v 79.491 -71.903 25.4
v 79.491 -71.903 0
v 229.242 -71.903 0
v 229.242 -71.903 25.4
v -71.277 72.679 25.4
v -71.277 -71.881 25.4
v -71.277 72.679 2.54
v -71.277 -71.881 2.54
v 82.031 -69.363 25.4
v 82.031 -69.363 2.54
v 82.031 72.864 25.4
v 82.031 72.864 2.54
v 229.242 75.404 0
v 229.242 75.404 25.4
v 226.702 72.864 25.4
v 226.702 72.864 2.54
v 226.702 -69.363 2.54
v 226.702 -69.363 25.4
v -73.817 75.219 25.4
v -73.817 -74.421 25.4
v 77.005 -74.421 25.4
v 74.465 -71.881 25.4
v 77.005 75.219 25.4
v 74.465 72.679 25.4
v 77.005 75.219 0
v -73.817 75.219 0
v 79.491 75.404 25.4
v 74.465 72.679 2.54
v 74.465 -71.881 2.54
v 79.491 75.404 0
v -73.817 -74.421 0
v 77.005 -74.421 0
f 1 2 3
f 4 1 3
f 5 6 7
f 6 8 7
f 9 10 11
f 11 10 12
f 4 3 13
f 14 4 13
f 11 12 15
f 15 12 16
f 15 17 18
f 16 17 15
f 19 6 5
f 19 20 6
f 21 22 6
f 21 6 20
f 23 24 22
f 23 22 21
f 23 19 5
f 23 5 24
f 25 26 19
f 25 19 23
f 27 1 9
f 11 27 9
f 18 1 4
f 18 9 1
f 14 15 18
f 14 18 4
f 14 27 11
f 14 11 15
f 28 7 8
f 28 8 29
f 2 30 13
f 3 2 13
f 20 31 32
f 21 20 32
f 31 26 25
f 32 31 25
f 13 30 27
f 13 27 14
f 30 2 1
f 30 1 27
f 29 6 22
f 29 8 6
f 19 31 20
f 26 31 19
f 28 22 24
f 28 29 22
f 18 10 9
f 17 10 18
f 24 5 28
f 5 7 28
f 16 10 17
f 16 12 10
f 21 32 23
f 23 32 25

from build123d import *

# Parameters (mm, degrees)
F0_W     = 150.821939
F0_H     = 149.639666
F1_DEPTH = 25.4
F2_T     = -2.54
F3_W     = 149.751067
F3_H     = 147.307307
F4_DEPTH = 25.4
F5_T     = -2.54


with BuildPart() as f1:
    # F0 (on Top) → F1 (new body)
    with BuildSketch(Plane.XY):
        with Locations((1.594313, 0.39912)):
            Rectangle(F0_W, F0_H)
    extrude(amount=F1_DEPTH)

    # F2
    f2_openings = [f1.faces().sort_by_distance(p)[0] for p in [
        (1.594312, 0.39912, 25.4),
    ]]
    offset(amount=F2_T, openings=f2_openings)


with BuildPart() as f4:
    # F3 (on Top) → F4 (new body)
    with BuildSketch(Plane.XY):
        with Locations((154.366419, 1.750521)):
            Rectangle(F3_W, F3_H)
    extrude(amount=F4_DEPTH)

    # F5
    f5_openings = [f4.faces().sort_by_distance(p)[0] for p in [
        (154.366419, 1.750521, 25.4),
    ]]
    offset(amount=F5_T, openings=f5_openings)


solid = Compound([f1.part, f4.part])
